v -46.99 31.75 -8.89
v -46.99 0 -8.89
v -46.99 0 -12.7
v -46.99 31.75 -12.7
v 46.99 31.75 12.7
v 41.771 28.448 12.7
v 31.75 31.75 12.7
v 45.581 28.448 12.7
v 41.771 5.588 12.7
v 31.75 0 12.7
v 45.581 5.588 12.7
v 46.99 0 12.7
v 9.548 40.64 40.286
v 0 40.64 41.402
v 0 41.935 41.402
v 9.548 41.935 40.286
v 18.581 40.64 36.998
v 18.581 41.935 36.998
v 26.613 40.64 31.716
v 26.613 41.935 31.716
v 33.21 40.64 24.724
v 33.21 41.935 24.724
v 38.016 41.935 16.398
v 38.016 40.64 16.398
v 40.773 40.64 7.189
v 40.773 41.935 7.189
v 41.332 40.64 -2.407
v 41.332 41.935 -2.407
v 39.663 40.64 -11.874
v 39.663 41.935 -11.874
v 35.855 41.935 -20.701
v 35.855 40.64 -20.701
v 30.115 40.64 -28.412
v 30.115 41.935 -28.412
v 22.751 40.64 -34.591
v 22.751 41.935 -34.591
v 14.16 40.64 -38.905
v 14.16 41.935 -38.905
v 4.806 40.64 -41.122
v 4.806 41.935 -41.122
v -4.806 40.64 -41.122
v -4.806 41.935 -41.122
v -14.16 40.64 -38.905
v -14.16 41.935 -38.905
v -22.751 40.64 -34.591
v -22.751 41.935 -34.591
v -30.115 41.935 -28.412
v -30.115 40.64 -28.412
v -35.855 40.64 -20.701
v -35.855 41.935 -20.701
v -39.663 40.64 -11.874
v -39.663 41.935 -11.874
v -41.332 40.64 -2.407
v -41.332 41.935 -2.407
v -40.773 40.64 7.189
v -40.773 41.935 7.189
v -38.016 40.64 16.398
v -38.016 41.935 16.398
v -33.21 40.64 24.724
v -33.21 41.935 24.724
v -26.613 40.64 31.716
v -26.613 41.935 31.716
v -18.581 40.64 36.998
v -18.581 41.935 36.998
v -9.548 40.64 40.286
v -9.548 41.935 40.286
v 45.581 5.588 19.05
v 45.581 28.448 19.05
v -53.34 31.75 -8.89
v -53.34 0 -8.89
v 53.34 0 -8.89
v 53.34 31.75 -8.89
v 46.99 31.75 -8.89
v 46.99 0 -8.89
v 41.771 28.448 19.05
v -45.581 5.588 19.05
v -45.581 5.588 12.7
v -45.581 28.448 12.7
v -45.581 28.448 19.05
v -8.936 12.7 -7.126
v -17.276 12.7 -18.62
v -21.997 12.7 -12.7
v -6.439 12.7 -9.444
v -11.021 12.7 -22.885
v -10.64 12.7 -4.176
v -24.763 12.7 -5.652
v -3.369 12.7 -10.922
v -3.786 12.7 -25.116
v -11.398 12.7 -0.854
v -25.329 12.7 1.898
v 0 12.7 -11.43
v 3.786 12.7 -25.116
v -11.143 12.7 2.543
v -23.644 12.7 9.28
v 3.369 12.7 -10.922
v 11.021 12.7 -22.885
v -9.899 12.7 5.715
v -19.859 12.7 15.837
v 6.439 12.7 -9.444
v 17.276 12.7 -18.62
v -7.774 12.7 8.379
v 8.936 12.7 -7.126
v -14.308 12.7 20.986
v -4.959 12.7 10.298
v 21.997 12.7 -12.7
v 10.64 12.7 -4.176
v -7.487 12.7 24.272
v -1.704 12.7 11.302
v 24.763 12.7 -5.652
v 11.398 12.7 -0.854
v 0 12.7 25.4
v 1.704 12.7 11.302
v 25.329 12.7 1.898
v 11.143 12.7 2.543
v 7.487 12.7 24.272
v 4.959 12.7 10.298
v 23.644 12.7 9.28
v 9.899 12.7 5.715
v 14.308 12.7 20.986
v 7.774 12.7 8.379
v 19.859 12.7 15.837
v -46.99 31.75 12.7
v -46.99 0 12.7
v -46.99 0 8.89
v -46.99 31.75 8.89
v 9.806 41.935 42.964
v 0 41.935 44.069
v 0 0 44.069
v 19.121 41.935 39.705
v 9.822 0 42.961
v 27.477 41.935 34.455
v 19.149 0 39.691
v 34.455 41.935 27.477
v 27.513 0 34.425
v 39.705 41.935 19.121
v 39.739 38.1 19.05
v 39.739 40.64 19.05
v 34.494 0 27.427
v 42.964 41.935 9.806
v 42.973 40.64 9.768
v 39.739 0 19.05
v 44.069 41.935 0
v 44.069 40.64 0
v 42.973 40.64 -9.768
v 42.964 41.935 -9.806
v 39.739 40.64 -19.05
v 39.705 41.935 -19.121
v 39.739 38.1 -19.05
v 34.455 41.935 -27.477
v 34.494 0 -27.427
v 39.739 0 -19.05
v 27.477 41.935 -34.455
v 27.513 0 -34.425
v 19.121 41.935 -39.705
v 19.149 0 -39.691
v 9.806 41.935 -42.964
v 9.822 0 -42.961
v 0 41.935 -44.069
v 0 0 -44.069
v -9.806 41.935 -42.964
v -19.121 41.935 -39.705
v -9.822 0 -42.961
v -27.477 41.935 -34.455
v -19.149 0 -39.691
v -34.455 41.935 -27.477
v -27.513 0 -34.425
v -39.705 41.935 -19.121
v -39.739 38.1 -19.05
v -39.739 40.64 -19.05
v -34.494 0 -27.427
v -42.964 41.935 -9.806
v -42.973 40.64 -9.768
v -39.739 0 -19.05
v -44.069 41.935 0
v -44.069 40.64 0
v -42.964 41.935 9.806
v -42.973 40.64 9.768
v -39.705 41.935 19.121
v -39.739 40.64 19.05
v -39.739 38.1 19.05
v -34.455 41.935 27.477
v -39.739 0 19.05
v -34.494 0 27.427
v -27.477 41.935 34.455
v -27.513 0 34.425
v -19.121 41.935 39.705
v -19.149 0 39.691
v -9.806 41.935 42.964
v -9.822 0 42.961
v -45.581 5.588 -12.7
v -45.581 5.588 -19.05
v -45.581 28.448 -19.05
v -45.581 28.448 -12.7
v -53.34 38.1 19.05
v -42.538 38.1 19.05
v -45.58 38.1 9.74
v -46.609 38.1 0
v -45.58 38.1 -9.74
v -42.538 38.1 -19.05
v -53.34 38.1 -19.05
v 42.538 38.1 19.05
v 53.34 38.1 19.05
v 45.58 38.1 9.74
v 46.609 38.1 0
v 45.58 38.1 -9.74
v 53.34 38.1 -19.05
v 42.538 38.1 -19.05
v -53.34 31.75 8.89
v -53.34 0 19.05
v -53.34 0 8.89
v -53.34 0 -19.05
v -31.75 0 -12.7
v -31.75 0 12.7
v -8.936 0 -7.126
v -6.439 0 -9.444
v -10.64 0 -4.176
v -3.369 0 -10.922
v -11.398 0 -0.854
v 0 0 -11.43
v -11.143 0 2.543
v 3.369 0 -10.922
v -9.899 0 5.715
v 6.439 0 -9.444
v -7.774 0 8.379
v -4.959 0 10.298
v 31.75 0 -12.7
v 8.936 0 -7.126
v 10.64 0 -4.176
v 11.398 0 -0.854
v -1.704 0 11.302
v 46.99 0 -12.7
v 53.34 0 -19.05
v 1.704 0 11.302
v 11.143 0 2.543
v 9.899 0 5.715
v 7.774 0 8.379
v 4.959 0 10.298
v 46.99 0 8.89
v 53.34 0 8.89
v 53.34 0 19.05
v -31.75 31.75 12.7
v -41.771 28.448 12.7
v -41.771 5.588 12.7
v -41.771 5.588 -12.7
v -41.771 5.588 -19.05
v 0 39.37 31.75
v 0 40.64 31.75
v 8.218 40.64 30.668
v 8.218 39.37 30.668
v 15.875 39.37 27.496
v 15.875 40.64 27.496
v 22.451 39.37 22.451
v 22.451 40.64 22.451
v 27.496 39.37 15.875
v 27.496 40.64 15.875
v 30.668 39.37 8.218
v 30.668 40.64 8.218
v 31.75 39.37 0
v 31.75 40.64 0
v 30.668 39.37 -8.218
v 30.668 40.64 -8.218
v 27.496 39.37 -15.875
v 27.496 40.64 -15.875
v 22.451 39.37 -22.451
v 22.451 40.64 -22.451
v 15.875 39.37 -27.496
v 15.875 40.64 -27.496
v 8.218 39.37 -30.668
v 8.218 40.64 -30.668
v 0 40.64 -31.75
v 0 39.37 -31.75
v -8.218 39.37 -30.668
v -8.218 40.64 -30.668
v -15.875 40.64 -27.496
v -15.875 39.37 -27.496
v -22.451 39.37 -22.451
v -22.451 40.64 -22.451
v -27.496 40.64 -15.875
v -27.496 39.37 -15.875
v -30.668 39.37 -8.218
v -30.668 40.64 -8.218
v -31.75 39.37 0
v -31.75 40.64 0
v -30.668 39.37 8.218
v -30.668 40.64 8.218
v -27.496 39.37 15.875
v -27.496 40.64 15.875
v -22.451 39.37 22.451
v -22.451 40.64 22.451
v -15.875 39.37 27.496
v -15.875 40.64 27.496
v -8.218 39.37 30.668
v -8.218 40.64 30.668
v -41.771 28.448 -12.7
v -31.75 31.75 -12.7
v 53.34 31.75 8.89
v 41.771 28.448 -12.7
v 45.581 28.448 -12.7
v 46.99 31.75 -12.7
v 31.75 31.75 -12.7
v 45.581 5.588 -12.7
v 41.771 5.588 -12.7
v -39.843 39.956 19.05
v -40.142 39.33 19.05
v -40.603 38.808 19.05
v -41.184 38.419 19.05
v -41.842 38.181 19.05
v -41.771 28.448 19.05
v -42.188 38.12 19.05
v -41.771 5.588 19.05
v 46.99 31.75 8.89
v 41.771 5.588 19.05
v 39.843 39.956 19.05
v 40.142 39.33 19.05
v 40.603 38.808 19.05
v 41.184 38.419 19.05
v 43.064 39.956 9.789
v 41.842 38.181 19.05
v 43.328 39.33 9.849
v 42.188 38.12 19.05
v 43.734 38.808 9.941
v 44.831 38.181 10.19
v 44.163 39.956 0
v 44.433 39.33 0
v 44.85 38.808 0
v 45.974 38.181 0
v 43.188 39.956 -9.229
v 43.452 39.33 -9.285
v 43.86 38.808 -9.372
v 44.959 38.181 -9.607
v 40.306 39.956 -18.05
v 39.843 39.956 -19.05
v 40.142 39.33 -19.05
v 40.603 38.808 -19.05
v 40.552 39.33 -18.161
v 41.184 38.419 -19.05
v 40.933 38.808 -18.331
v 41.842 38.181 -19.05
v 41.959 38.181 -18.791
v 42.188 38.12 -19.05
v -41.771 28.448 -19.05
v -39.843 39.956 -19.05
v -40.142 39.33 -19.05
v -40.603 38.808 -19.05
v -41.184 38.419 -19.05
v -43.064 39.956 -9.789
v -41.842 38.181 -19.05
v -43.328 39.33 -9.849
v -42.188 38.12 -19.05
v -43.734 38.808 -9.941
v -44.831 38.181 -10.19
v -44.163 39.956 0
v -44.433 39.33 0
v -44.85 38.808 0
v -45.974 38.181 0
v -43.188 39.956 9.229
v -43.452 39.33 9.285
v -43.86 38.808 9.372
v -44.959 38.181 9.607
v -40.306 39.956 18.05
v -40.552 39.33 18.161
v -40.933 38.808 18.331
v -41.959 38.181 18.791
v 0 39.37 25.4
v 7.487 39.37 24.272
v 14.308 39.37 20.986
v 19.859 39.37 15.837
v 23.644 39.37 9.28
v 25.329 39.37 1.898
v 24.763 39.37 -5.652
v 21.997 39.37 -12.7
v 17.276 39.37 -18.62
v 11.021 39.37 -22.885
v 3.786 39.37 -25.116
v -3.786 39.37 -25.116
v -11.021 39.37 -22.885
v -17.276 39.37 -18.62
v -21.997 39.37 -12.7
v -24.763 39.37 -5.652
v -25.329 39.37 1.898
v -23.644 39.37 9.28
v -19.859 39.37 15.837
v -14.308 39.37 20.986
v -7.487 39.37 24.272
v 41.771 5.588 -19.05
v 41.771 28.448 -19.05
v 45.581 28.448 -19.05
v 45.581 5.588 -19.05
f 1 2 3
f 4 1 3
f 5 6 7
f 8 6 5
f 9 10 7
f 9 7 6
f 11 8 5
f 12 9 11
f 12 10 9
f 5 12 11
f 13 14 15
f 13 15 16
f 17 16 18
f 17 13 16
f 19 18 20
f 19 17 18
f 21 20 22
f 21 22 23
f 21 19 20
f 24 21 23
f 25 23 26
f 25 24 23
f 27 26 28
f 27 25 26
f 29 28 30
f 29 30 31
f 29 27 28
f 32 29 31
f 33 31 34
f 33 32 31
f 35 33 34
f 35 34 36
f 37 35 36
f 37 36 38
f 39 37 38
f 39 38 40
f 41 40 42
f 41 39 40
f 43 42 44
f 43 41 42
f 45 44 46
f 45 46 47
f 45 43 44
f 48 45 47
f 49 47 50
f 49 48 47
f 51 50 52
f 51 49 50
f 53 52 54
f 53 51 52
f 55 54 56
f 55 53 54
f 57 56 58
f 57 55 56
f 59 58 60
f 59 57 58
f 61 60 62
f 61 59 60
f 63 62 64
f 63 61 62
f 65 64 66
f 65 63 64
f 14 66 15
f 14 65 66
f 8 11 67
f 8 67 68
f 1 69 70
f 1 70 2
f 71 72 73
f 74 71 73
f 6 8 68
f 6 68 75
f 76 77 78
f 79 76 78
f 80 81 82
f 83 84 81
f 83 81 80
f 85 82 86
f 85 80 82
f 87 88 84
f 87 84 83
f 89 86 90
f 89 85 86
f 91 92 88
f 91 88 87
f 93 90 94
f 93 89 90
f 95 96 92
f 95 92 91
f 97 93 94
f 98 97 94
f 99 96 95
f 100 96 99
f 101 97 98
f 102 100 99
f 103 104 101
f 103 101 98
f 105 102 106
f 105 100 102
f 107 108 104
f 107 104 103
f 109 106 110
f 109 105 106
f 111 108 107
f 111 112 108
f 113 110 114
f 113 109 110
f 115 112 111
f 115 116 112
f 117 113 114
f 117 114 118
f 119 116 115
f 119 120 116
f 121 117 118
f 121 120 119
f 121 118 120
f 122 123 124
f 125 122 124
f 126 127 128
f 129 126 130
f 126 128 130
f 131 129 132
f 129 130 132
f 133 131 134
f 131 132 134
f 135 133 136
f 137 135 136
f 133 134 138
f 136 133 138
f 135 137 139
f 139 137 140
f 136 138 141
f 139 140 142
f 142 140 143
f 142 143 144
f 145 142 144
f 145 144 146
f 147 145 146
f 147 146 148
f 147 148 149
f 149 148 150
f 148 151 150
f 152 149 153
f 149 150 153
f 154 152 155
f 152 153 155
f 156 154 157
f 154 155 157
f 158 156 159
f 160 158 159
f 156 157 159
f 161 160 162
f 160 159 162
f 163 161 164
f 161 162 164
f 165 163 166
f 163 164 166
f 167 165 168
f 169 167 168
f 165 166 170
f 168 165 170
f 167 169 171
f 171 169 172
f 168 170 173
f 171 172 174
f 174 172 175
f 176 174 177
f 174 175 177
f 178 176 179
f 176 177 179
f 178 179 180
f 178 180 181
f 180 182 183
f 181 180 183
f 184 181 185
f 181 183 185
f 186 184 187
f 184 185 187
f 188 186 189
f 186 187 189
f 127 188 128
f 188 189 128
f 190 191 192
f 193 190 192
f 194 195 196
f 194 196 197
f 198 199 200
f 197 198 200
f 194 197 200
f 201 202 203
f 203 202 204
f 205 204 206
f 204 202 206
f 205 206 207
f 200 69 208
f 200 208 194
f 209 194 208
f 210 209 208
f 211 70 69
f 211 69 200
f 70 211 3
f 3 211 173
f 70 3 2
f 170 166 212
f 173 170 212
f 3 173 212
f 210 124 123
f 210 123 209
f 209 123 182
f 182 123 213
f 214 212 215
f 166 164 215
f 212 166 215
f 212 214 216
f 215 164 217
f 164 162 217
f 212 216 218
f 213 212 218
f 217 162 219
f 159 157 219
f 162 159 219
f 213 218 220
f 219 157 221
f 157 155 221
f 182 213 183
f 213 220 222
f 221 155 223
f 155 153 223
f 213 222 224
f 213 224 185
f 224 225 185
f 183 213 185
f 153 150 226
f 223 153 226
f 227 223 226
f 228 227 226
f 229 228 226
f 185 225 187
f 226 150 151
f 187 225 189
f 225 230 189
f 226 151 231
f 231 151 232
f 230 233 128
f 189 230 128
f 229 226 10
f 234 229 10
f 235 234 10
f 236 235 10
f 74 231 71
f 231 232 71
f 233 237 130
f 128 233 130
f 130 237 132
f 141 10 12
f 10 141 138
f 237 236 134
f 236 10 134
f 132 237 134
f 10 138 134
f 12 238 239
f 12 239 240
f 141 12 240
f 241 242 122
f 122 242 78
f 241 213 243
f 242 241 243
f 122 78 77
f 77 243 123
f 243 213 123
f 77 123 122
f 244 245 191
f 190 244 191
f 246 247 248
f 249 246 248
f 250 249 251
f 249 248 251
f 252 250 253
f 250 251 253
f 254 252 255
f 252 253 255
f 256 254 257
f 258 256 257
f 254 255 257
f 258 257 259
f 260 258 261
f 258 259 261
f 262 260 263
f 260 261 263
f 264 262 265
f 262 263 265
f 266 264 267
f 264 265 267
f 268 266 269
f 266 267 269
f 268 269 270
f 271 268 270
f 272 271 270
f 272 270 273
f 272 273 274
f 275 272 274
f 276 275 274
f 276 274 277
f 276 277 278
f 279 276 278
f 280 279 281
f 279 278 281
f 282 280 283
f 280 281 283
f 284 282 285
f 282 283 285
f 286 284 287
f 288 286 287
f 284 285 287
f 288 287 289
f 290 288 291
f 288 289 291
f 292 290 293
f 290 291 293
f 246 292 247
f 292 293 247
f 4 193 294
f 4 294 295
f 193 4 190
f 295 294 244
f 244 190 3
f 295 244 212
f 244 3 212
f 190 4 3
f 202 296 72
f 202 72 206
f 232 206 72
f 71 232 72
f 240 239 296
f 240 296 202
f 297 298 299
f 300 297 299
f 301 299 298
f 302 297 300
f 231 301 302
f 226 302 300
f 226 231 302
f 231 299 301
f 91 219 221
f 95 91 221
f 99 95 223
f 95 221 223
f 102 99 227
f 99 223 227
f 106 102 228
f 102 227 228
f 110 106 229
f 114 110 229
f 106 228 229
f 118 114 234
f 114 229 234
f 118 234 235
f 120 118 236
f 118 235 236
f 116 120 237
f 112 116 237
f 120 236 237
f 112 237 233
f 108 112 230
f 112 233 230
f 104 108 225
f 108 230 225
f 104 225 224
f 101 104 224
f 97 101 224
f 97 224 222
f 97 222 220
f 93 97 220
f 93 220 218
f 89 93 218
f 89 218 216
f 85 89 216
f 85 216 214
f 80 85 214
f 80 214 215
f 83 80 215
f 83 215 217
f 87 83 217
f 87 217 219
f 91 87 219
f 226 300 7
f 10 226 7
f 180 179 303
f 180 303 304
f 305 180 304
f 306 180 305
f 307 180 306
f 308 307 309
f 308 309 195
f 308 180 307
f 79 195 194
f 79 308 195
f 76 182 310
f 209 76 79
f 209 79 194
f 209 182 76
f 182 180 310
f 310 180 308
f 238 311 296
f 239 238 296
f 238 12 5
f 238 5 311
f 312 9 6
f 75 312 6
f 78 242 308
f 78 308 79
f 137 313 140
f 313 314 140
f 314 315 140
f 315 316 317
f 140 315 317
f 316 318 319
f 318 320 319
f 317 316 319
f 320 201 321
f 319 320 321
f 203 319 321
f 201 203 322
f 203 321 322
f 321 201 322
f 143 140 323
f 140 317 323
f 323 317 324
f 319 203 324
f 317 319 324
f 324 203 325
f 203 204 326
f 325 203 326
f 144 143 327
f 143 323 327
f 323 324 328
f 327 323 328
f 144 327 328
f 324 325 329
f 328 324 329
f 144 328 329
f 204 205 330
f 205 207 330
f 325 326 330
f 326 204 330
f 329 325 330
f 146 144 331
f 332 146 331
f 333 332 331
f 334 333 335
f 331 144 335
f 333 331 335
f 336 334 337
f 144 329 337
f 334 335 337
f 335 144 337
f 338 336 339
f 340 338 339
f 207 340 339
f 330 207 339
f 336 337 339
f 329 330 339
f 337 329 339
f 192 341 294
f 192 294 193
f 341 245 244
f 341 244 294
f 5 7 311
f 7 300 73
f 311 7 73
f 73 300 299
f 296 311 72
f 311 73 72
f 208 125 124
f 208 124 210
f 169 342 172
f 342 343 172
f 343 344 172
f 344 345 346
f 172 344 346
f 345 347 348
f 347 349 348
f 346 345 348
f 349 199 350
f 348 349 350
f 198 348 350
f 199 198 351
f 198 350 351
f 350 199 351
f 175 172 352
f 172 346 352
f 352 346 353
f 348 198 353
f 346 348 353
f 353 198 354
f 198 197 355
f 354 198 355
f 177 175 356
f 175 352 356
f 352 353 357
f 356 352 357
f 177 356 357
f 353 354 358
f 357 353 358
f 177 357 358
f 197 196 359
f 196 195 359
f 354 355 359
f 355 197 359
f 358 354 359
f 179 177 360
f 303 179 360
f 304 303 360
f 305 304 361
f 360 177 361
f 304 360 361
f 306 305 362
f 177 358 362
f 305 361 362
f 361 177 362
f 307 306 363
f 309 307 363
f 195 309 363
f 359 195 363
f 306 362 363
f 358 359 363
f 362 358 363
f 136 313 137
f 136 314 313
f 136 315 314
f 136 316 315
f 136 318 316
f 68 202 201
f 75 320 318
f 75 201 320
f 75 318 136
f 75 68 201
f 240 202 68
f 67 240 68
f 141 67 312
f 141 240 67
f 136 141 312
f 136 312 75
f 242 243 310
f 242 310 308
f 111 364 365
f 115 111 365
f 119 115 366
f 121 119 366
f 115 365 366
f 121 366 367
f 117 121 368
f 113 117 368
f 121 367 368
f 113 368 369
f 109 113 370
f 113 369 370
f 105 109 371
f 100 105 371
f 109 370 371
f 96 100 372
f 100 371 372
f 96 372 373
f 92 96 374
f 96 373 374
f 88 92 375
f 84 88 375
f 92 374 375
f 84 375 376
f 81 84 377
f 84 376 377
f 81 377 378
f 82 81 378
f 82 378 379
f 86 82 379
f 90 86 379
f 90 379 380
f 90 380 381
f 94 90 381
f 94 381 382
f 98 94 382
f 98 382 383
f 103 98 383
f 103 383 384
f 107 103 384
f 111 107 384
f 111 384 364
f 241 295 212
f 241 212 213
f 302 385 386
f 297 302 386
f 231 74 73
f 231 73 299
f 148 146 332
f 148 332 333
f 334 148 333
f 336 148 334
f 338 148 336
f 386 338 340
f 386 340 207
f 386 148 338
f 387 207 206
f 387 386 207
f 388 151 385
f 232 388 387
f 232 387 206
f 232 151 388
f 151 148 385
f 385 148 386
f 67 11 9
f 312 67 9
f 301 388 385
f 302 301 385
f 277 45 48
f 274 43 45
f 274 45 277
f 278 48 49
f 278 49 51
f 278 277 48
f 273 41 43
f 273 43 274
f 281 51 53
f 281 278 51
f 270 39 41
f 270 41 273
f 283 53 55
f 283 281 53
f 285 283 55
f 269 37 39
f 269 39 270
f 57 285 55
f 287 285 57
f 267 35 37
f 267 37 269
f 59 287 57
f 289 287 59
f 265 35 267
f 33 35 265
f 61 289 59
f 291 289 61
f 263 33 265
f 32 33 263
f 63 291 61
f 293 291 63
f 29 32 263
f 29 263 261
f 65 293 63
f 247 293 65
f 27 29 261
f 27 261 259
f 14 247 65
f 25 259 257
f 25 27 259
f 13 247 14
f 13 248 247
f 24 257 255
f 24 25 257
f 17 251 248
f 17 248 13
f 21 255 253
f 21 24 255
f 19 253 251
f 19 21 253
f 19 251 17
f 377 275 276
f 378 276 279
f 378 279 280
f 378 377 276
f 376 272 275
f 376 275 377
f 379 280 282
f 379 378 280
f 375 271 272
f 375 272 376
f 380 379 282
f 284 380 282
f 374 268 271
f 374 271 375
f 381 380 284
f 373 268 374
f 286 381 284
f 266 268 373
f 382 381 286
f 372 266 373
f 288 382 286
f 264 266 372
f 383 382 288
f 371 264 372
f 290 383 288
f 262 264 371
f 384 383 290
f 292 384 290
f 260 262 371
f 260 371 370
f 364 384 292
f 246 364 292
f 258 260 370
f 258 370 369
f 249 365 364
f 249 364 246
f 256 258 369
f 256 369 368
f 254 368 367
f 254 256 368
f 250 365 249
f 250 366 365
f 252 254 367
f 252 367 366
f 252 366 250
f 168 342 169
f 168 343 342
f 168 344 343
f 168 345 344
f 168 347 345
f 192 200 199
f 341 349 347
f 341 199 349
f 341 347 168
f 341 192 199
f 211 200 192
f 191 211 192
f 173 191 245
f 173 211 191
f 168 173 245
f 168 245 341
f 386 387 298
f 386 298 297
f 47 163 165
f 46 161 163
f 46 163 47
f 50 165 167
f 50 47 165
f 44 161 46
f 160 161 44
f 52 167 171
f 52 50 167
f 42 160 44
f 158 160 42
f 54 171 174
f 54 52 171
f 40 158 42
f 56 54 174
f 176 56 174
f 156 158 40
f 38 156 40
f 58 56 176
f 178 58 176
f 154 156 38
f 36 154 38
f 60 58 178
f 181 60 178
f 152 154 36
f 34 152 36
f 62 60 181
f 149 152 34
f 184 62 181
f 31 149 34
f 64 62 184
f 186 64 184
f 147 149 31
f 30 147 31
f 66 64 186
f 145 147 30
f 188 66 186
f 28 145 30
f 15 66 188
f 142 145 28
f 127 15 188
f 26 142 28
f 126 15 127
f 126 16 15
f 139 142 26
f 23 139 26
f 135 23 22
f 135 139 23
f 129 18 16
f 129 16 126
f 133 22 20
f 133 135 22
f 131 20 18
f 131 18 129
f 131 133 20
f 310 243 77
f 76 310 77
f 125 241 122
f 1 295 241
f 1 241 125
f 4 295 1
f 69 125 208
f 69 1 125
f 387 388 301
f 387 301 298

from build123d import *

# Parameters (mm, degrees)
SKETCH1_R           = 44.069
BOSS_EXTRUDE1_DEPTH = 40.64
SKETCH2_R           = 44.069
SKETCH2_R_2         = 41.402
BOSS_EXTRUDE2_DEPTH = 1.2954
BOSS_EXTRUDE3_DEPTH = 38.1
CUT_EXTRUDE1_DEPTH  = 31.75
SKETCH5_W           = 3.81
SKETCH5_H           = 22.86
CUT_EXTRUDE2_DEPTH  = 93.670068167
FILLET1_R           = 2.54
SKETCH7_R           = 25.4
CUT_EXTRUDE3_DEPTH  = 27.94
SKETCH8_R           = 11.43
CUT_EXTRUDE4_DEPTH  = 81.906181129
SKETCH9_R           = 31.75
CUT_EXTRUDE5_DEPTH  = 1.27


with BuildPart() as part:
    # Sketch1 → Boss-Extrude1 (new body)
    with BuildSketch(Plane(origin=(0, 0, 0), x_dir=(1, 0, 0), z_dir=(0, 1, 0))):
        with Locations(Location((0, 0, 0), (0, 0, 270))):
            Circle(SKETCH1_R)
    extrude(amount=BOSS_EXTRUDE1_DEPTH)

    # Sketch2 → Boss-Extrude2 (add)
    with BuildSketch(Plane(origin=(0, 40.64, 0), x_dir=(1, 0, 0), z_dir=(0, 1, 0))):
        with Locations(Location((0, 0, 0), (0, 0, 270))):
            Circle(SKETCH2_R)
        with Locations(Location((0, 0, 0), (0, 0, 270))):
            Circle(SKETCH2_R_2, mode=Mode.SUBTRACT)
    extrude(amount=BOSS_EXTRUDE2_DEPTH)

    # Sketch3 → Boss-Extrude3 (add)
    with BuildSketch(Plane(origin=(0, 0, 0), x_dir=(1, 0, 0), z_dir=(0, 1, 0))):
        with BuildLine():
            ThreePointArc((39.738825612, -19.05), (44.069, 0), (39.738825612, 19.05))
            Line((39.738825612, 19.05), (53.34, 19.05))
            Line((53.34, 19.05), (53.34, -19.05))
            Line((53.34, -19.05), (39.738825612, -19.05))
        make_face()
        with BuildLine():
            ThreePointArc((-39.738825612, 19.05), (-44.069, 0), (-39.738825612, -19.05))
            Line((-39.738825612, -19.05), (-53.34, -19.05))
            Line((-53.34, -19.05), (-53.34, 19.05))
            Line((-53.34, 19.05), (-39.738825612, 19.05))
        make_face()
    extrude(amount=BOSS_EXTRUDE3_DEPTH)

    # Sketch4 → Cut-Extrude1 (cut)
    with BuildSketch(Plane(origin=(0, 0, 0), x_dir=(1, 0, 0), z_dir=(0, 1, 0))):
        Polygon((-53.34, -8.89), (-53.34, 8.89), (-46.99, 8.89), (-46.99, 12.7), (-31.75, 12.7), (-31.75, -12.7), (-46.99, -12.7), (-46.99, -8.89), align=None)
        Polygon((46.99, -12.7), (46.99, -8.89), (53.34, -8.89), (53.34, 8.89), (46.99, 8.89), (46.99, 12.7), (31.75, 12.7), (31.75, -12.7), align=None)
    extrude(amount=CUT_EXTRUDE1_DEPTH, mode=Mode.SUBTRACT)

    # Sketch5 → Cut-Extrude2 (cut, through all)
    with BuildSketch(Plane(origin=(0, 0, -19.05), x_dir=(-1, 0, 0), z_dir=(0, 0, -1))):
        with Locations((43.675825612, 17.018)):
            Rectangle(SKETCH5_W, SKETCH5_H)
        with Locations((-43.675825612, 17.018)):
            Rectangle(SKETCH5_W, SKETCH5_H)
    extrude(amount=-CUT_EXTRUDE2_DEPTH, mode=Mode.SUBTRACT)

    # Fillet1
    fillet1_edges = [part.edges().sort_by_distance(p)[0] for p in [
        (44.069, 38.1, 0),
        (-44.069, 38.1, 0),
    ]]
    fillet(fillet1_edges, radius=FILLET1_R)

    # Sketch7 → Cut-Extrude3 (cut)
    with BuildSketch(Plane(origin=(0, 40.64, 0), x_dir=(1, 0, 0), z_dir=(0, 1, 0))):
        with Locations(Location((0, 0, 0), (0, 0, 270))):
            Circle(SKETCH7_R)
    extrude(amount=-CUT_EXTRUDE3_DEPTH, mode=Mode.SUBTRACT)

    # Sketch8 → Cut-Extrude4 (cut, through all)
    with BuildSketch(Plane.XZ):
        with Locations(Location((0, 0, 0), (0, 0, 270))):
            Circle(SKETCH8_R)
    extrude(amount=-CUT_EXTRUDE4_DEPTH, mode=Mode.SUBTRACT)

    # Sketch9 → Cut-Extrude5 (cut)
    with BuildSketch(Plane(origin=(0, 40.64, 0), x_dir=(1, 0, 0), z_dir=(0, 1, 0))):
        with Locations(Location((0, 0, 0), (0, 0, 270))):
            Circle(SKETCH9_R)
    extrude(amount=-CUT_EXTRUDE5_DEPTH, mode=Mode.SUBTRACT)


solid = part.part
